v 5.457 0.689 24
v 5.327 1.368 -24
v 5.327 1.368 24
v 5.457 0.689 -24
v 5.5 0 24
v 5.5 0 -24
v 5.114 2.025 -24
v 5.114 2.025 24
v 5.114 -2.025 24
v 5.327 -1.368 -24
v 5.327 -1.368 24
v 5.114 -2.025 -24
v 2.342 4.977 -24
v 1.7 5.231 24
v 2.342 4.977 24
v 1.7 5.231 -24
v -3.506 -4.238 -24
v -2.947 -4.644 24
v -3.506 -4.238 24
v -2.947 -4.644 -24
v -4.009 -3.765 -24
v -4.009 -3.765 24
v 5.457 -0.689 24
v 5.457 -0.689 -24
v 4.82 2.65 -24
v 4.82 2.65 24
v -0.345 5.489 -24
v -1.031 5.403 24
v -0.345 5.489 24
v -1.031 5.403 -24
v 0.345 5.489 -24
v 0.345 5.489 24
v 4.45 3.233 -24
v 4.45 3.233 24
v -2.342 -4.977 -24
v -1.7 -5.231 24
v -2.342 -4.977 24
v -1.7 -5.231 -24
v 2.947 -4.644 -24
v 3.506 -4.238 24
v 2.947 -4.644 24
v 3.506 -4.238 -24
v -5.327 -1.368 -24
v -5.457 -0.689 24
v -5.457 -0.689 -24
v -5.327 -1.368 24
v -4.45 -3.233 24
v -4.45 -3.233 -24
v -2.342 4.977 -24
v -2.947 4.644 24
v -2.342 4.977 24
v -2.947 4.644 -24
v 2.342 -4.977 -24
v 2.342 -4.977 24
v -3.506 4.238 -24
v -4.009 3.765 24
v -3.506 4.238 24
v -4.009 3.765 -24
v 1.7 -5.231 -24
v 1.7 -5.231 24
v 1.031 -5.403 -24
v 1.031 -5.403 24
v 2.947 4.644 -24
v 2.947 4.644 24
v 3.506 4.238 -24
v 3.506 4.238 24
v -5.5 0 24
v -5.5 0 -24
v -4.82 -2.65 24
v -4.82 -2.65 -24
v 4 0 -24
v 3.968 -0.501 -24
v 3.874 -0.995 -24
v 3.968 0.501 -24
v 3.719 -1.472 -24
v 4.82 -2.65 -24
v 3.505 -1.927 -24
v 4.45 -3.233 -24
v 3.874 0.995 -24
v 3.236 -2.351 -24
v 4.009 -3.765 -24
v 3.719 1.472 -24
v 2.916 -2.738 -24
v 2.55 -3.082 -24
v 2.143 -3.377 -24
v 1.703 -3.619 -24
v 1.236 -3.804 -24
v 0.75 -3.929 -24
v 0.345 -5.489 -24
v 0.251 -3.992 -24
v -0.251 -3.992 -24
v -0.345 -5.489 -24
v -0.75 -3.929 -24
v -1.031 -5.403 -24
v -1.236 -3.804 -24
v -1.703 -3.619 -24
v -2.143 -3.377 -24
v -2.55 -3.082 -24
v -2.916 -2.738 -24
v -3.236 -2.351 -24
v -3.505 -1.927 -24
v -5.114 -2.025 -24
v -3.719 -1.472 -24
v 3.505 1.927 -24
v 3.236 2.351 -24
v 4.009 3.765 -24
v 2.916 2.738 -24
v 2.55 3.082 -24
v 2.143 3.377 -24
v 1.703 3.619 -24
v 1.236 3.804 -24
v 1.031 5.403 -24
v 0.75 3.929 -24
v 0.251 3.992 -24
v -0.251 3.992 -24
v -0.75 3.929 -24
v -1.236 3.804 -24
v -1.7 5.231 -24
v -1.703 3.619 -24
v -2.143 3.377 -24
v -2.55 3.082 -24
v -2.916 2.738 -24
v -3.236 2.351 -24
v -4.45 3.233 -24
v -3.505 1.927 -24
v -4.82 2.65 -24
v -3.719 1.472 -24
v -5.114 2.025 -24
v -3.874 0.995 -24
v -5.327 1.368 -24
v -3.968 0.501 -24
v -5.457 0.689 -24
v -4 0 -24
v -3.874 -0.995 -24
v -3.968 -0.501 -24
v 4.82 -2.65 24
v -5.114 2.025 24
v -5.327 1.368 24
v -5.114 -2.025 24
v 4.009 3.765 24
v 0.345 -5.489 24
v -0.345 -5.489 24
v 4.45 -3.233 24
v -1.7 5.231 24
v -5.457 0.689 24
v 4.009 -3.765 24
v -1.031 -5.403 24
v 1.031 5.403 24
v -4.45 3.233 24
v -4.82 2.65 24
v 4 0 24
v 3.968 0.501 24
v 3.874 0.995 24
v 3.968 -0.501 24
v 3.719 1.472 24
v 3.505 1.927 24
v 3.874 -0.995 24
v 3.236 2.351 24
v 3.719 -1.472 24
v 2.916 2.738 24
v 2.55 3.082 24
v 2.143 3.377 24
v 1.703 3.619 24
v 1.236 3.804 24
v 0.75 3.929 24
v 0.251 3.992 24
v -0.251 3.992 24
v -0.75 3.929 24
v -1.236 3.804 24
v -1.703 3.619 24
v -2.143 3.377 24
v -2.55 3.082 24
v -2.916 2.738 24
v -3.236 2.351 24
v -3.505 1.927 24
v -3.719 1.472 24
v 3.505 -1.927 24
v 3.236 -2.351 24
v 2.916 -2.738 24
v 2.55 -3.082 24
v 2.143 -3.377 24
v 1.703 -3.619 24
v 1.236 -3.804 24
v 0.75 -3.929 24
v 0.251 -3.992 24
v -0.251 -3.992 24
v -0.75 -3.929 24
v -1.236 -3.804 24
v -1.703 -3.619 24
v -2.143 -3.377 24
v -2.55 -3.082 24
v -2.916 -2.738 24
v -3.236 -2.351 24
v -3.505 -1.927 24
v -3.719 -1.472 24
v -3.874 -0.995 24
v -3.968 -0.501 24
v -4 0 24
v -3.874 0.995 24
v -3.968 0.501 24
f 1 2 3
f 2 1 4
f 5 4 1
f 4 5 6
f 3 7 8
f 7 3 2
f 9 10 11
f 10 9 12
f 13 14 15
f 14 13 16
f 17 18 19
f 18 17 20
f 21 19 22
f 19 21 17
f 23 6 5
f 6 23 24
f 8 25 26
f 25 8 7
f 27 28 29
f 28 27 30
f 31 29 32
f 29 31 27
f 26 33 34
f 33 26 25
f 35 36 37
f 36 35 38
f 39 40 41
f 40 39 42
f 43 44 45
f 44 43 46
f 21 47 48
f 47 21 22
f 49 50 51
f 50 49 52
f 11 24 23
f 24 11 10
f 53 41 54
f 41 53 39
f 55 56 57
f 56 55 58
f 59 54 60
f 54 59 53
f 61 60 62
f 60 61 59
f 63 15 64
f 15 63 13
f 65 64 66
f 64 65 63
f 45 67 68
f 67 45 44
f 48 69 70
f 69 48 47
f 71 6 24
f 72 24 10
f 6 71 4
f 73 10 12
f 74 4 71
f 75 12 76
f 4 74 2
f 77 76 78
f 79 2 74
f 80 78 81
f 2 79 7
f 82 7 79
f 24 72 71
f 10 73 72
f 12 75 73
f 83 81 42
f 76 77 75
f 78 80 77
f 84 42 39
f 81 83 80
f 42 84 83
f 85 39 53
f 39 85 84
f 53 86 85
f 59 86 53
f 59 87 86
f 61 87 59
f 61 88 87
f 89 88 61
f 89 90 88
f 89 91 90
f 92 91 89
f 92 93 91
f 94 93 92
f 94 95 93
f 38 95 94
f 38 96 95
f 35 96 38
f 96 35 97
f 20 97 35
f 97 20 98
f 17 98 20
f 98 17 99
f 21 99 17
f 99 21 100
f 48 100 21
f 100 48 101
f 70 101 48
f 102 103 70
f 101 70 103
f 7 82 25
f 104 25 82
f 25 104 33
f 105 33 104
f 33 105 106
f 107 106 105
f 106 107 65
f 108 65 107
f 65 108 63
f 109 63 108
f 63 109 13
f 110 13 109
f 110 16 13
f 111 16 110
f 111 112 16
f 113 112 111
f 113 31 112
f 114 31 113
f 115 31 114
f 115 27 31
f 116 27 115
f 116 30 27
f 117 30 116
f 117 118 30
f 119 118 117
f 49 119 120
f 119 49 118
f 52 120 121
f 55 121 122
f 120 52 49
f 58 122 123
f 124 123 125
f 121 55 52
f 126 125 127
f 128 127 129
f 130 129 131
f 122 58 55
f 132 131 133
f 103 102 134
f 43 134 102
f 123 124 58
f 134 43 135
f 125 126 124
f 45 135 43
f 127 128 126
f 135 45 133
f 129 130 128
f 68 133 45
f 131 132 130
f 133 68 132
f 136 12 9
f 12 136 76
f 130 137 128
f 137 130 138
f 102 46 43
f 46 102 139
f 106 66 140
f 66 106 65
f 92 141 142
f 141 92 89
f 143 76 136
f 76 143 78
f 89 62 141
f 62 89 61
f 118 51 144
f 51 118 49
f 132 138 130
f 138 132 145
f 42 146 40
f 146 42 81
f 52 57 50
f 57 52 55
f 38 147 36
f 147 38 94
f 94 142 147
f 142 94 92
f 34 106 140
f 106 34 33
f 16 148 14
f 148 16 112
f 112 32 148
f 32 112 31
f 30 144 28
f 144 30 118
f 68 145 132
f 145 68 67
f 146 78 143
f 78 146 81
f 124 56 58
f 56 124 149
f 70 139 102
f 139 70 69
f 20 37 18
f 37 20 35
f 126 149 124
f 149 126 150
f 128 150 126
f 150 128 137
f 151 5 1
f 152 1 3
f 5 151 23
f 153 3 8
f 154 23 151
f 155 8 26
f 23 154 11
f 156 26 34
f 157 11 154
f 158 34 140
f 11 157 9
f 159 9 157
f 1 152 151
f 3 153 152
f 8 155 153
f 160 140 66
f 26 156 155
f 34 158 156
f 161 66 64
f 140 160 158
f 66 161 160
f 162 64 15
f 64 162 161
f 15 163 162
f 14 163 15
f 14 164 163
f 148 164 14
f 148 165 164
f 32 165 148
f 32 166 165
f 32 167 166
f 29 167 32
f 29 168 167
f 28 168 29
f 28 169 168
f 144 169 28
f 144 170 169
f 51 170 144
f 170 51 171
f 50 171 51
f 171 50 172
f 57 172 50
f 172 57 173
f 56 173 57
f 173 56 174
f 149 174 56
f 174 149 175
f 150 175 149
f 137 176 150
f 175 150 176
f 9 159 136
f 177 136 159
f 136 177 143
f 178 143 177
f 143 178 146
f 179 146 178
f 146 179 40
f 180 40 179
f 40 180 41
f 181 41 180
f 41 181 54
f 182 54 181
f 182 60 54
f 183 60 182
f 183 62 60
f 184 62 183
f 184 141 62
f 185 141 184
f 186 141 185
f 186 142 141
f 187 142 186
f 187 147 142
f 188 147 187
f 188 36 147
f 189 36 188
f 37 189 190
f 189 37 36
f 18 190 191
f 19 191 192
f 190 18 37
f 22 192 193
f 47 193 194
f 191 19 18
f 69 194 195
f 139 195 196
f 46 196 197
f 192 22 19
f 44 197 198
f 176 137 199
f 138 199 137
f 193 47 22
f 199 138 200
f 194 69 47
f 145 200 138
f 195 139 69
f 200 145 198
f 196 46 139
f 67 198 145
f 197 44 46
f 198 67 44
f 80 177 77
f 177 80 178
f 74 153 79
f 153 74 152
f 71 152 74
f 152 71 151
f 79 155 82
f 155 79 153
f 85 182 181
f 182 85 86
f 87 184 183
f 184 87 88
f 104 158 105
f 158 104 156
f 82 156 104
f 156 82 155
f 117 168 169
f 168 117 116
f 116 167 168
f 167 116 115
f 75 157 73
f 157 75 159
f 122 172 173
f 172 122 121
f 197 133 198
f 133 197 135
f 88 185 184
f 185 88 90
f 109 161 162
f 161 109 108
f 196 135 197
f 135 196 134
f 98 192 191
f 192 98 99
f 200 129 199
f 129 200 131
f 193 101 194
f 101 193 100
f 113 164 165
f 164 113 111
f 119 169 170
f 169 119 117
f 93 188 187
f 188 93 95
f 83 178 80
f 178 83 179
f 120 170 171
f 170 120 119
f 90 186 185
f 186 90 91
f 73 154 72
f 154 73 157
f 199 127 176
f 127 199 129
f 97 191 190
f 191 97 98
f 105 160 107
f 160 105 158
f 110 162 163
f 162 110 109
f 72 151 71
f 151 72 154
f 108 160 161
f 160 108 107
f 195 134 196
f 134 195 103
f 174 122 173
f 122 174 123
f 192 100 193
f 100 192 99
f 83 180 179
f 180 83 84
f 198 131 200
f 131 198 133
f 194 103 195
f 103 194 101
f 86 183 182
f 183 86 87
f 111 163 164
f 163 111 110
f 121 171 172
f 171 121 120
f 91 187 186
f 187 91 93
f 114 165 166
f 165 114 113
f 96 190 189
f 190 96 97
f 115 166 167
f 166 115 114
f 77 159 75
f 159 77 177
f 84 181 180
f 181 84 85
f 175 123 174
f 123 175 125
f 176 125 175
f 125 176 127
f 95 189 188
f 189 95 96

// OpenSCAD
$fn = 50;


difference() {
	union() {
		translate(v = [0, 0, -24.0000000000]) {
			cylinder(h = 48, r = 5.5000000000);
		}
	}
	union() {
		translate(v = [0, 0, -100.0000000000]) {
			cylinder(h = 200, r = 4.0000000000);
		}
	}
}
